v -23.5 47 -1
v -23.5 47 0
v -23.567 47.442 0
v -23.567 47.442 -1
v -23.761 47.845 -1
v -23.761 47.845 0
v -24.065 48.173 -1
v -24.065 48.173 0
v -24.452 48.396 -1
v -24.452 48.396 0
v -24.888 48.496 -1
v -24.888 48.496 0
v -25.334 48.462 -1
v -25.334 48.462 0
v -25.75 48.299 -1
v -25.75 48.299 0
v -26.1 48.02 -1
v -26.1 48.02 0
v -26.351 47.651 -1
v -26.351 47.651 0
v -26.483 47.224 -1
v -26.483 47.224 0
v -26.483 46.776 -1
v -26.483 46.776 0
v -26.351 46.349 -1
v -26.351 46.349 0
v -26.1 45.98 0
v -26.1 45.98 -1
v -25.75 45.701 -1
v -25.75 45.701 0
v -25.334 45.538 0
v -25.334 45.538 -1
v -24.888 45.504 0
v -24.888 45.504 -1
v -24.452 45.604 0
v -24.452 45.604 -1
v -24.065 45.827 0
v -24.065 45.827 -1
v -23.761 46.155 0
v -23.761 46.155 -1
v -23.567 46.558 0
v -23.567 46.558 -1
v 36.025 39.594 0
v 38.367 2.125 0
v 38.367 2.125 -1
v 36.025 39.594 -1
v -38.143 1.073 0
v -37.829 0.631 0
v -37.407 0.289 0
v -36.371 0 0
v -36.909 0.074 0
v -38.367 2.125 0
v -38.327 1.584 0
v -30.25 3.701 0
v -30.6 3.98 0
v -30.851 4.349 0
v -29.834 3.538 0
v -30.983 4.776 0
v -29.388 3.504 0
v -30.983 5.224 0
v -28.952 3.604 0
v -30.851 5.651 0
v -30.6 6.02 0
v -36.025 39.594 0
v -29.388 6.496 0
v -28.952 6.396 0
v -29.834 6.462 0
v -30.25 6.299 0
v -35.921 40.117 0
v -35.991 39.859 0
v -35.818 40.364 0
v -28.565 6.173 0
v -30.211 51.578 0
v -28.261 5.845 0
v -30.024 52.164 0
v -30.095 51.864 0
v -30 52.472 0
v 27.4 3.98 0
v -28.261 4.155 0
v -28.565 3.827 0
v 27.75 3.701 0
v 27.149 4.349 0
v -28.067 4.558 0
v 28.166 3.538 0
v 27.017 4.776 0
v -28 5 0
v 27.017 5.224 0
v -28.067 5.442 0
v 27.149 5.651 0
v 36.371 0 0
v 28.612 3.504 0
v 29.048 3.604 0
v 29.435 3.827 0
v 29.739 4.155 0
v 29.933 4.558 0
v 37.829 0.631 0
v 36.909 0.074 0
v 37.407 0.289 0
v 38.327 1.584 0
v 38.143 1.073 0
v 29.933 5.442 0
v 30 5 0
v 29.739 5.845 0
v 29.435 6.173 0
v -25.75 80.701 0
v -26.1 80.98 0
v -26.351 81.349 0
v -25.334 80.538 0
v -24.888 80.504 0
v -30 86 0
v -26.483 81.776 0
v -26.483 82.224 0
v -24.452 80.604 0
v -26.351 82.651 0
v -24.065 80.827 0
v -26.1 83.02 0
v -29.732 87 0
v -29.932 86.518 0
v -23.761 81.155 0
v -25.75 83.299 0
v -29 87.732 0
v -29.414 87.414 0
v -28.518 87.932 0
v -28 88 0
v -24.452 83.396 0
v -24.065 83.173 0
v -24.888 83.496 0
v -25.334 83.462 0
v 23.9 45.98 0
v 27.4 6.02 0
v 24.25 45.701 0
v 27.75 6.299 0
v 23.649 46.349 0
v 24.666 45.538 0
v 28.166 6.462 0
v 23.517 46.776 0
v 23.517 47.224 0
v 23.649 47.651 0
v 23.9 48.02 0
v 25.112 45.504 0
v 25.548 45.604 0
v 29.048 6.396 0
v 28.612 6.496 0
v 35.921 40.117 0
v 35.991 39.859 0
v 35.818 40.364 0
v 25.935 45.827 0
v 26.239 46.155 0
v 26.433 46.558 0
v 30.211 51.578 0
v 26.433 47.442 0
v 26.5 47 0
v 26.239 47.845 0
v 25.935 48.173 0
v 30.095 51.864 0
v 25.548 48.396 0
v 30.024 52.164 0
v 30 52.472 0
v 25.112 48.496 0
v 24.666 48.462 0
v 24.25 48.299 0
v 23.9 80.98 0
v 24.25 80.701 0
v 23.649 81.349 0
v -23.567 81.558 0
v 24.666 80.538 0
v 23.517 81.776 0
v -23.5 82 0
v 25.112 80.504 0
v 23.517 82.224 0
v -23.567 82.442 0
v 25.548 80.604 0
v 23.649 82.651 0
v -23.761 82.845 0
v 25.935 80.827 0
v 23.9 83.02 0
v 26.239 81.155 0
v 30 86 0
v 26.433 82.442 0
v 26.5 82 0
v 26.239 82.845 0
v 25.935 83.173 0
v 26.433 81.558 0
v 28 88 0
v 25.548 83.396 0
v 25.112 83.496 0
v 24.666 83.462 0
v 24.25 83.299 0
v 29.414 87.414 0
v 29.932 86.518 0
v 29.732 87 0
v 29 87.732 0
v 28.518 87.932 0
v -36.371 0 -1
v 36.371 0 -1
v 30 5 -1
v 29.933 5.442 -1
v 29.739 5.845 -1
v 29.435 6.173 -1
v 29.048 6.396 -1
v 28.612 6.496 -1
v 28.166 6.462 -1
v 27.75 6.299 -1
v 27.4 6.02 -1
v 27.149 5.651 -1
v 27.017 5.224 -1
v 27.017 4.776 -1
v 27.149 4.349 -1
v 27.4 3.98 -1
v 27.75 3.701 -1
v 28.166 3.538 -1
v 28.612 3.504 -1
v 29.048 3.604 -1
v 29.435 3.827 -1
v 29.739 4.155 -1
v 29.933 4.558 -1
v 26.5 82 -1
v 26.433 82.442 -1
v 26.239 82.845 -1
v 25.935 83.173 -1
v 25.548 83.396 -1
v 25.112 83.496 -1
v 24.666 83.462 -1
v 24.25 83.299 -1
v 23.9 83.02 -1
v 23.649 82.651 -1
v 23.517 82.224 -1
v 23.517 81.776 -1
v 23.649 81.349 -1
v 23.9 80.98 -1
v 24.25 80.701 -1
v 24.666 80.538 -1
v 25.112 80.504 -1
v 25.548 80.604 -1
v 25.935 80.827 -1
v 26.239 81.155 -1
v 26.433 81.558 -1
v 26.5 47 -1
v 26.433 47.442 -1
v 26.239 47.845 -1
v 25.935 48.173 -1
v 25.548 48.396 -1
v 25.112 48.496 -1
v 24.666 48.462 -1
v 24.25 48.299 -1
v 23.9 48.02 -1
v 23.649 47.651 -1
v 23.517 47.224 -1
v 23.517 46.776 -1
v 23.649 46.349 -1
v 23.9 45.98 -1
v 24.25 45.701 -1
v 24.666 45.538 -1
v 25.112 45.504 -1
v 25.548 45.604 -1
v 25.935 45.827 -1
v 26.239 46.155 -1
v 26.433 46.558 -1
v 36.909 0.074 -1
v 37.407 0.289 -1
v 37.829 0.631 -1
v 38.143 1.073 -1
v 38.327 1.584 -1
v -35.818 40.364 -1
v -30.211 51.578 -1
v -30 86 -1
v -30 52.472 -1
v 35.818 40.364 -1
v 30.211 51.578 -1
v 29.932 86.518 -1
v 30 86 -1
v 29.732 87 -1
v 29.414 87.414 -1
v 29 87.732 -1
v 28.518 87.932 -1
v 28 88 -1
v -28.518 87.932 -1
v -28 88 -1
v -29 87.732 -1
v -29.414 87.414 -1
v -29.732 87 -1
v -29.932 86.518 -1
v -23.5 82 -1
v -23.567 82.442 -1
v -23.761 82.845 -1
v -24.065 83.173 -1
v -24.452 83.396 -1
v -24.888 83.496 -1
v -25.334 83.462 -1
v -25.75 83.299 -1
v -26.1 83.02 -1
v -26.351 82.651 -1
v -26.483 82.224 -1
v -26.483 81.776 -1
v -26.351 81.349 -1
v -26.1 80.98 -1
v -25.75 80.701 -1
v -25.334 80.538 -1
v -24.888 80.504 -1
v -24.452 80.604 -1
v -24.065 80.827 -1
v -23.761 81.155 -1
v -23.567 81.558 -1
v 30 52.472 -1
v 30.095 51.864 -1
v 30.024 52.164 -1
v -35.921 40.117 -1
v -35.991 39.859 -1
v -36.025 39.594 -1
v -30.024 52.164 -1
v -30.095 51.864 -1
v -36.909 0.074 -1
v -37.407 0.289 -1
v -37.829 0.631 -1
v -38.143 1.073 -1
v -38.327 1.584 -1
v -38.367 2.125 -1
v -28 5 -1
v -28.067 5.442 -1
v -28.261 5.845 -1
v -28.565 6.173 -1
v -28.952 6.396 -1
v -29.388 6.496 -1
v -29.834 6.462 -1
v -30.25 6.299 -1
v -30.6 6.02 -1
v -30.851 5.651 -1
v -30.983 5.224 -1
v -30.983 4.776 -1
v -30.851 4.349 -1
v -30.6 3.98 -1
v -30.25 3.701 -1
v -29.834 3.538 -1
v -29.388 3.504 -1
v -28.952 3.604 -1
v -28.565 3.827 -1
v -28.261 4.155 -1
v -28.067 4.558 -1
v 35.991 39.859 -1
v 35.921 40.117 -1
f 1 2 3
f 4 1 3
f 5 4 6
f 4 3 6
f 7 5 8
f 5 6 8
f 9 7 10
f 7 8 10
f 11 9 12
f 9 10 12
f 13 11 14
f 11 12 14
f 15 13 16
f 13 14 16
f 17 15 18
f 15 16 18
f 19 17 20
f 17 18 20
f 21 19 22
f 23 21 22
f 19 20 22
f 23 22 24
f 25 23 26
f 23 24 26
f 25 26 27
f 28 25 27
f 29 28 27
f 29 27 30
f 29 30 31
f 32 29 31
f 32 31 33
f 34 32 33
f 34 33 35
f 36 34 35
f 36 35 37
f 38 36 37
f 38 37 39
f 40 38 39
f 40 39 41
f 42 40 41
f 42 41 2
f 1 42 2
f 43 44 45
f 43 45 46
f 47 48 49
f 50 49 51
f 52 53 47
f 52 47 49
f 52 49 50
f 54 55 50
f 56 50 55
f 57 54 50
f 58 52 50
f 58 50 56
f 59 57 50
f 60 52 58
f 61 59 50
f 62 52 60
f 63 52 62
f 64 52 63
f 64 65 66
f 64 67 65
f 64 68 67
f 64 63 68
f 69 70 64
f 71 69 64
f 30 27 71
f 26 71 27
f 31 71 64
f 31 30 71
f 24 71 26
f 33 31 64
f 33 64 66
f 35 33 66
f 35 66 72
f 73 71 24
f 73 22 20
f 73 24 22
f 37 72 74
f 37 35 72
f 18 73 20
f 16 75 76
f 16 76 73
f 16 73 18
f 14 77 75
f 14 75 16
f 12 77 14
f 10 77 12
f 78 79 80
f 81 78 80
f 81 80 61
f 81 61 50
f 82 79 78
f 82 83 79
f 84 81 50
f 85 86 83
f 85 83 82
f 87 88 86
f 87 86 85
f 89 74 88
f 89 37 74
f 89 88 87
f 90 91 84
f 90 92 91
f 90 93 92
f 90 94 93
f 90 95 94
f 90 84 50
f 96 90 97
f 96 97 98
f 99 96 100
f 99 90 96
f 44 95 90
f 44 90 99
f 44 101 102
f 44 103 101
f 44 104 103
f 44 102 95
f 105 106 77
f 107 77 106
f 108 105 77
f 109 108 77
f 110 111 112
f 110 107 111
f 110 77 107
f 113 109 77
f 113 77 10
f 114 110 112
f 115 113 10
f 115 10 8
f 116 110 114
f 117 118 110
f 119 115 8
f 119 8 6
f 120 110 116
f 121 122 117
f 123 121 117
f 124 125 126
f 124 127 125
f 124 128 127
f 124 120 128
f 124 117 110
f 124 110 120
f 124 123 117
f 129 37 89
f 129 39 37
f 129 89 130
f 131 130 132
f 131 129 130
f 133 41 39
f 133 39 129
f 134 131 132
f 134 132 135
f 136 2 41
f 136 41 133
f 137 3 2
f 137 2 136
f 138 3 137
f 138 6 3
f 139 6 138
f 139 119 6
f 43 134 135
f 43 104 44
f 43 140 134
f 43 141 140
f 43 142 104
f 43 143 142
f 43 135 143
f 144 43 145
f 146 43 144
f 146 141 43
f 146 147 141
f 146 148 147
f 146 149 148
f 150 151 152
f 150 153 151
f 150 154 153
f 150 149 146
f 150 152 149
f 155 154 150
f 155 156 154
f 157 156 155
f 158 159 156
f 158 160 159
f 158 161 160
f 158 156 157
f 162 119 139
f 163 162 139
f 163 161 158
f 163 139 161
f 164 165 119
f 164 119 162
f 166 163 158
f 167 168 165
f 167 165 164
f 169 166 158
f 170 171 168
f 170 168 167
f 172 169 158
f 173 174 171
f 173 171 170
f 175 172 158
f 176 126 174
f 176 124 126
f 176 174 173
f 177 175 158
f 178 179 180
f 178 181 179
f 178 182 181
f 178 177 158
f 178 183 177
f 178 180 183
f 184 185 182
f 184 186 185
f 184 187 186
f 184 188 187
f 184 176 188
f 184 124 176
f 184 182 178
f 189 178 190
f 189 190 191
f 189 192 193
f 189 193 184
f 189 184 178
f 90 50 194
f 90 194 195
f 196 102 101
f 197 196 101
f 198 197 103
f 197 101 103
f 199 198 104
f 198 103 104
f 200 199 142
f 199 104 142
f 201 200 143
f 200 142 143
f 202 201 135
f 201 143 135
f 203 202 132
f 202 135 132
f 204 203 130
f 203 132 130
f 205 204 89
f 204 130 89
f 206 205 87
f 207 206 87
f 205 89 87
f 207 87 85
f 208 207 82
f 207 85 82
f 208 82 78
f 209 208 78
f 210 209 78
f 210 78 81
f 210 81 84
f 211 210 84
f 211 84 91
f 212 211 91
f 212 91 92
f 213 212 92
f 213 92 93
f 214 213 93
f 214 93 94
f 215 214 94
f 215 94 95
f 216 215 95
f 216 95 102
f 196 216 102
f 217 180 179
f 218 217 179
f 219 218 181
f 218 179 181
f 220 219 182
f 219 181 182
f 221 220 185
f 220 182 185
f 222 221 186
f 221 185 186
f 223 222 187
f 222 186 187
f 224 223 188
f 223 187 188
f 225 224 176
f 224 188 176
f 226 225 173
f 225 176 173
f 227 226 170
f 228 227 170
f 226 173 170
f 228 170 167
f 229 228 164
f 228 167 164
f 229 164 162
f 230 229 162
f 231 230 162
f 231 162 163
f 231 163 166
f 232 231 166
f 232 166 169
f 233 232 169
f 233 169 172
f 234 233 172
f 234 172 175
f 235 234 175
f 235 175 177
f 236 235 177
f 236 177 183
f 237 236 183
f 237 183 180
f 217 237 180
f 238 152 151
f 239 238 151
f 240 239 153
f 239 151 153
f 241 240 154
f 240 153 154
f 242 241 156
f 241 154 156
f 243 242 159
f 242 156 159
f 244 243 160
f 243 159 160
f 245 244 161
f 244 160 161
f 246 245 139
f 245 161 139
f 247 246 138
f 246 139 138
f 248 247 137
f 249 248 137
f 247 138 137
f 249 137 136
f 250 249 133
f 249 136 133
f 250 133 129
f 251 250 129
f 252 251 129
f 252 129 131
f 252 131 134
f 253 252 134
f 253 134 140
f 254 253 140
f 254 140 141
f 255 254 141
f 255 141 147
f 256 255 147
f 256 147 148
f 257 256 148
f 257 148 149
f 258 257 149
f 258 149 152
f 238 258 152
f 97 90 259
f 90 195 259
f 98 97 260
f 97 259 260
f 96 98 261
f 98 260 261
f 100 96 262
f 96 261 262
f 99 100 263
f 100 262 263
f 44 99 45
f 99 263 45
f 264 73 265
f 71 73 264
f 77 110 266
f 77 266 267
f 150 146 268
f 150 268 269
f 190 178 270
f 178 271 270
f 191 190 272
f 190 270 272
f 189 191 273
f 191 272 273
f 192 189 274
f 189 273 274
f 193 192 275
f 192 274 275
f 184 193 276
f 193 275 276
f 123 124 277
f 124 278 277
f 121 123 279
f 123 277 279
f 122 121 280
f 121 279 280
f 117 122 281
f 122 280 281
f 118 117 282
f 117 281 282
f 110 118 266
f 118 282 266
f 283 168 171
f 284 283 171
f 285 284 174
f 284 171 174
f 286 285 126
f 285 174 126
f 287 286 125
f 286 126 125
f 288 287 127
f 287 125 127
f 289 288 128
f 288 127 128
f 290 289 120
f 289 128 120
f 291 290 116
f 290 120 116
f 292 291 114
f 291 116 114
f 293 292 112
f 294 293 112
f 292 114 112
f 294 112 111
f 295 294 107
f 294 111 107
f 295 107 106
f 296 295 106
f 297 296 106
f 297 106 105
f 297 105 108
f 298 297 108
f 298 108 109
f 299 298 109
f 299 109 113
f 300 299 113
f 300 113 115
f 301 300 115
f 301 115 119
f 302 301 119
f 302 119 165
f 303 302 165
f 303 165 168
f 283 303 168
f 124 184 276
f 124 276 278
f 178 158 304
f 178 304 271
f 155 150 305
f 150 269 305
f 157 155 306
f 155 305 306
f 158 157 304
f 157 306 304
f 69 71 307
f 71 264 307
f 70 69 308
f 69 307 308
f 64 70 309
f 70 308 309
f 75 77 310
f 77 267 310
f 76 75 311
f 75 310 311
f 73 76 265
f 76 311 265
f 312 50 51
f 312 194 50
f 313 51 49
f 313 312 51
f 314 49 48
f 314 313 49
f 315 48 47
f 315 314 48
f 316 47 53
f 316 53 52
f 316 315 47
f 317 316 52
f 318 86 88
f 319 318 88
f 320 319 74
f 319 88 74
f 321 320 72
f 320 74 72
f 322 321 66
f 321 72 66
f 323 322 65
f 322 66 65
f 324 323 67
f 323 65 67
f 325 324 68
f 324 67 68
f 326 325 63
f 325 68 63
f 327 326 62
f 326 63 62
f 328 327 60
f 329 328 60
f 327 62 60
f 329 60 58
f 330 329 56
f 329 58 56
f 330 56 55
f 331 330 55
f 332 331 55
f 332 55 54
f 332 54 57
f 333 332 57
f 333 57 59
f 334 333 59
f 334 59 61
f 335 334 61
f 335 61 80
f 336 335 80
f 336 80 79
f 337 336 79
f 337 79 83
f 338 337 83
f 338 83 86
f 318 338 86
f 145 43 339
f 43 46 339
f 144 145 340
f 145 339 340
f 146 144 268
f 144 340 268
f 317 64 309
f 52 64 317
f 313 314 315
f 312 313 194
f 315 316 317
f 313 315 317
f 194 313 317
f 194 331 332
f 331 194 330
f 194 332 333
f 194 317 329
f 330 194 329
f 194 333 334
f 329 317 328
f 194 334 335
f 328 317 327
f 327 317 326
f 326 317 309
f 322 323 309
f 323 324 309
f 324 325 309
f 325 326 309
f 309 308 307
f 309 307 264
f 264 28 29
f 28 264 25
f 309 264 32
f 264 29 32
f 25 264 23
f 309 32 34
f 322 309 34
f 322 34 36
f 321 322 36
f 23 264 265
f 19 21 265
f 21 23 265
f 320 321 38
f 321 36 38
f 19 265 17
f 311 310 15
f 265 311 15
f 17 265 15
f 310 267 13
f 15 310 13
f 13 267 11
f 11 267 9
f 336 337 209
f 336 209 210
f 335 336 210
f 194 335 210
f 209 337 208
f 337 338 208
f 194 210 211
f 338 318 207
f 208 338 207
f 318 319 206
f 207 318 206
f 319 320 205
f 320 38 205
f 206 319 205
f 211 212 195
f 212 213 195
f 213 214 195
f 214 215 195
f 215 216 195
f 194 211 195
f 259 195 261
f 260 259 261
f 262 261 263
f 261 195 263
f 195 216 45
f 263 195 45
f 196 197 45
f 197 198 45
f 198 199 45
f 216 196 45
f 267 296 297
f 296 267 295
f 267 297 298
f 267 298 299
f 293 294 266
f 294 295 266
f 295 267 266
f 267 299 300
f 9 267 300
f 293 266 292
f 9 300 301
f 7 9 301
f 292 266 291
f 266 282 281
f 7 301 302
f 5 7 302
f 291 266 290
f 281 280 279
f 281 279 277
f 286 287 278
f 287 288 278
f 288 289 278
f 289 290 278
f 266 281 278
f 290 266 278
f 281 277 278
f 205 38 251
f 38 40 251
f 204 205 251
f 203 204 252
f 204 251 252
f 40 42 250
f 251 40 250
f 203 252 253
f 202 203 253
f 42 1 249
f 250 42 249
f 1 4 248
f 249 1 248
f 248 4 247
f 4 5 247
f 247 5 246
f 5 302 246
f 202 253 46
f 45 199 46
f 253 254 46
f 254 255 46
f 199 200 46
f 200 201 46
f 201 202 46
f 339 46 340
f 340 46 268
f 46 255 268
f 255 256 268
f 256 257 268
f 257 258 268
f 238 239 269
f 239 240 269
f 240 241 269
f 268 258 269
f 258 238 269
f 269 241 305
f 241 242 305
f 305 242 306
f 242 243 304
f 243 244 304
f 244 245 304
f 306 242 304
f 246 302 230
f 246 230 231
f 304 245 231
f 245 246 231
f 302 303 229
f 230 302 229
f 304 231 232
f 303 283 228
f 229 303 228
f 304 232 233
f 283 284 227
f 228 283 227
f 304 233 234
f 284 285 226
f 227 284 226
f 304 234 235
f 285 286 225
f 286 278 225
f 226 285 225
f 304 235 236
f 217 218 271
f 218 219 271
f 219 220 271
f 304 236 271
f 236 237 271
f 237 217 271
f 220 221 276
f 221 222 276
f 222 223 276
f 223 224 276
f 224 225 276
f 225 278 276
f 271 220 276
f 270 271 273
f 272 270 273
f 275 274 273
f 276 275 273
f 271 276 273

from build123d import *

# Parameters (mm, degrees)
BASE_FLANGE1_DEPTH = 1
FILLET1_R          = 2
SKETCH6_R          = 1.5
CUT_EXTRUDE1_DEPTH = 97.006984786


# Sheet-metal steps are written as plain solids
with BuildPart() as part:
    # Sketch1 → Base-Flange1 (new body)
    with BuildSketch(Plane.XY):
        Polygon((-38.5, 0), (38.5, 0), (36, 40), (30, 52), (30, 88), (-30, 88), (-30, 52), (-36, 40), align=None)
    extrude(amount=-BASE_FLANGE1_DEPTH)

    # Fillet1
    fillet1_edges = [part.edges().sort_by_distance(p)[0] for p in [
        (38.5, 0, -0.5),
        (-38.5, 0, -0.5),
        (-36, 40, -0.5),
        (-30, 52, -0.5),
        (-30, 88, -0.5),
        (30, 88, -0.5),
        (30, 52, -0.5),
        (36, 40, -0.5),
    ]]
    fillet(fillet1_edges, radius=FILLET1_R)

    # Sketch6 → Cut-Extrude1 (cut, through all)
    with BuildSketch(Plane.XY):
        with Locations((-25, 82)):
            Circle(SKETCH6_R)
        with Locations((25, 82)):
            Circle(SKETCH6_R)
        with Locations((-25, 47)):
            Circle(SKETCH6_R)
        with Locations((25, 47)):
            Circle(SKETCH6_R)
        with Locations((-29.5, 5)):
            Circle(SKETCH6_R)
        with Locations((28.5, 5)):
            Circle(SKETCH6_R)
    extrude(amount=-CUT_EXTRUDE1_DEPTH, mode=Mode.SUBTRACT)


solid = part.part
